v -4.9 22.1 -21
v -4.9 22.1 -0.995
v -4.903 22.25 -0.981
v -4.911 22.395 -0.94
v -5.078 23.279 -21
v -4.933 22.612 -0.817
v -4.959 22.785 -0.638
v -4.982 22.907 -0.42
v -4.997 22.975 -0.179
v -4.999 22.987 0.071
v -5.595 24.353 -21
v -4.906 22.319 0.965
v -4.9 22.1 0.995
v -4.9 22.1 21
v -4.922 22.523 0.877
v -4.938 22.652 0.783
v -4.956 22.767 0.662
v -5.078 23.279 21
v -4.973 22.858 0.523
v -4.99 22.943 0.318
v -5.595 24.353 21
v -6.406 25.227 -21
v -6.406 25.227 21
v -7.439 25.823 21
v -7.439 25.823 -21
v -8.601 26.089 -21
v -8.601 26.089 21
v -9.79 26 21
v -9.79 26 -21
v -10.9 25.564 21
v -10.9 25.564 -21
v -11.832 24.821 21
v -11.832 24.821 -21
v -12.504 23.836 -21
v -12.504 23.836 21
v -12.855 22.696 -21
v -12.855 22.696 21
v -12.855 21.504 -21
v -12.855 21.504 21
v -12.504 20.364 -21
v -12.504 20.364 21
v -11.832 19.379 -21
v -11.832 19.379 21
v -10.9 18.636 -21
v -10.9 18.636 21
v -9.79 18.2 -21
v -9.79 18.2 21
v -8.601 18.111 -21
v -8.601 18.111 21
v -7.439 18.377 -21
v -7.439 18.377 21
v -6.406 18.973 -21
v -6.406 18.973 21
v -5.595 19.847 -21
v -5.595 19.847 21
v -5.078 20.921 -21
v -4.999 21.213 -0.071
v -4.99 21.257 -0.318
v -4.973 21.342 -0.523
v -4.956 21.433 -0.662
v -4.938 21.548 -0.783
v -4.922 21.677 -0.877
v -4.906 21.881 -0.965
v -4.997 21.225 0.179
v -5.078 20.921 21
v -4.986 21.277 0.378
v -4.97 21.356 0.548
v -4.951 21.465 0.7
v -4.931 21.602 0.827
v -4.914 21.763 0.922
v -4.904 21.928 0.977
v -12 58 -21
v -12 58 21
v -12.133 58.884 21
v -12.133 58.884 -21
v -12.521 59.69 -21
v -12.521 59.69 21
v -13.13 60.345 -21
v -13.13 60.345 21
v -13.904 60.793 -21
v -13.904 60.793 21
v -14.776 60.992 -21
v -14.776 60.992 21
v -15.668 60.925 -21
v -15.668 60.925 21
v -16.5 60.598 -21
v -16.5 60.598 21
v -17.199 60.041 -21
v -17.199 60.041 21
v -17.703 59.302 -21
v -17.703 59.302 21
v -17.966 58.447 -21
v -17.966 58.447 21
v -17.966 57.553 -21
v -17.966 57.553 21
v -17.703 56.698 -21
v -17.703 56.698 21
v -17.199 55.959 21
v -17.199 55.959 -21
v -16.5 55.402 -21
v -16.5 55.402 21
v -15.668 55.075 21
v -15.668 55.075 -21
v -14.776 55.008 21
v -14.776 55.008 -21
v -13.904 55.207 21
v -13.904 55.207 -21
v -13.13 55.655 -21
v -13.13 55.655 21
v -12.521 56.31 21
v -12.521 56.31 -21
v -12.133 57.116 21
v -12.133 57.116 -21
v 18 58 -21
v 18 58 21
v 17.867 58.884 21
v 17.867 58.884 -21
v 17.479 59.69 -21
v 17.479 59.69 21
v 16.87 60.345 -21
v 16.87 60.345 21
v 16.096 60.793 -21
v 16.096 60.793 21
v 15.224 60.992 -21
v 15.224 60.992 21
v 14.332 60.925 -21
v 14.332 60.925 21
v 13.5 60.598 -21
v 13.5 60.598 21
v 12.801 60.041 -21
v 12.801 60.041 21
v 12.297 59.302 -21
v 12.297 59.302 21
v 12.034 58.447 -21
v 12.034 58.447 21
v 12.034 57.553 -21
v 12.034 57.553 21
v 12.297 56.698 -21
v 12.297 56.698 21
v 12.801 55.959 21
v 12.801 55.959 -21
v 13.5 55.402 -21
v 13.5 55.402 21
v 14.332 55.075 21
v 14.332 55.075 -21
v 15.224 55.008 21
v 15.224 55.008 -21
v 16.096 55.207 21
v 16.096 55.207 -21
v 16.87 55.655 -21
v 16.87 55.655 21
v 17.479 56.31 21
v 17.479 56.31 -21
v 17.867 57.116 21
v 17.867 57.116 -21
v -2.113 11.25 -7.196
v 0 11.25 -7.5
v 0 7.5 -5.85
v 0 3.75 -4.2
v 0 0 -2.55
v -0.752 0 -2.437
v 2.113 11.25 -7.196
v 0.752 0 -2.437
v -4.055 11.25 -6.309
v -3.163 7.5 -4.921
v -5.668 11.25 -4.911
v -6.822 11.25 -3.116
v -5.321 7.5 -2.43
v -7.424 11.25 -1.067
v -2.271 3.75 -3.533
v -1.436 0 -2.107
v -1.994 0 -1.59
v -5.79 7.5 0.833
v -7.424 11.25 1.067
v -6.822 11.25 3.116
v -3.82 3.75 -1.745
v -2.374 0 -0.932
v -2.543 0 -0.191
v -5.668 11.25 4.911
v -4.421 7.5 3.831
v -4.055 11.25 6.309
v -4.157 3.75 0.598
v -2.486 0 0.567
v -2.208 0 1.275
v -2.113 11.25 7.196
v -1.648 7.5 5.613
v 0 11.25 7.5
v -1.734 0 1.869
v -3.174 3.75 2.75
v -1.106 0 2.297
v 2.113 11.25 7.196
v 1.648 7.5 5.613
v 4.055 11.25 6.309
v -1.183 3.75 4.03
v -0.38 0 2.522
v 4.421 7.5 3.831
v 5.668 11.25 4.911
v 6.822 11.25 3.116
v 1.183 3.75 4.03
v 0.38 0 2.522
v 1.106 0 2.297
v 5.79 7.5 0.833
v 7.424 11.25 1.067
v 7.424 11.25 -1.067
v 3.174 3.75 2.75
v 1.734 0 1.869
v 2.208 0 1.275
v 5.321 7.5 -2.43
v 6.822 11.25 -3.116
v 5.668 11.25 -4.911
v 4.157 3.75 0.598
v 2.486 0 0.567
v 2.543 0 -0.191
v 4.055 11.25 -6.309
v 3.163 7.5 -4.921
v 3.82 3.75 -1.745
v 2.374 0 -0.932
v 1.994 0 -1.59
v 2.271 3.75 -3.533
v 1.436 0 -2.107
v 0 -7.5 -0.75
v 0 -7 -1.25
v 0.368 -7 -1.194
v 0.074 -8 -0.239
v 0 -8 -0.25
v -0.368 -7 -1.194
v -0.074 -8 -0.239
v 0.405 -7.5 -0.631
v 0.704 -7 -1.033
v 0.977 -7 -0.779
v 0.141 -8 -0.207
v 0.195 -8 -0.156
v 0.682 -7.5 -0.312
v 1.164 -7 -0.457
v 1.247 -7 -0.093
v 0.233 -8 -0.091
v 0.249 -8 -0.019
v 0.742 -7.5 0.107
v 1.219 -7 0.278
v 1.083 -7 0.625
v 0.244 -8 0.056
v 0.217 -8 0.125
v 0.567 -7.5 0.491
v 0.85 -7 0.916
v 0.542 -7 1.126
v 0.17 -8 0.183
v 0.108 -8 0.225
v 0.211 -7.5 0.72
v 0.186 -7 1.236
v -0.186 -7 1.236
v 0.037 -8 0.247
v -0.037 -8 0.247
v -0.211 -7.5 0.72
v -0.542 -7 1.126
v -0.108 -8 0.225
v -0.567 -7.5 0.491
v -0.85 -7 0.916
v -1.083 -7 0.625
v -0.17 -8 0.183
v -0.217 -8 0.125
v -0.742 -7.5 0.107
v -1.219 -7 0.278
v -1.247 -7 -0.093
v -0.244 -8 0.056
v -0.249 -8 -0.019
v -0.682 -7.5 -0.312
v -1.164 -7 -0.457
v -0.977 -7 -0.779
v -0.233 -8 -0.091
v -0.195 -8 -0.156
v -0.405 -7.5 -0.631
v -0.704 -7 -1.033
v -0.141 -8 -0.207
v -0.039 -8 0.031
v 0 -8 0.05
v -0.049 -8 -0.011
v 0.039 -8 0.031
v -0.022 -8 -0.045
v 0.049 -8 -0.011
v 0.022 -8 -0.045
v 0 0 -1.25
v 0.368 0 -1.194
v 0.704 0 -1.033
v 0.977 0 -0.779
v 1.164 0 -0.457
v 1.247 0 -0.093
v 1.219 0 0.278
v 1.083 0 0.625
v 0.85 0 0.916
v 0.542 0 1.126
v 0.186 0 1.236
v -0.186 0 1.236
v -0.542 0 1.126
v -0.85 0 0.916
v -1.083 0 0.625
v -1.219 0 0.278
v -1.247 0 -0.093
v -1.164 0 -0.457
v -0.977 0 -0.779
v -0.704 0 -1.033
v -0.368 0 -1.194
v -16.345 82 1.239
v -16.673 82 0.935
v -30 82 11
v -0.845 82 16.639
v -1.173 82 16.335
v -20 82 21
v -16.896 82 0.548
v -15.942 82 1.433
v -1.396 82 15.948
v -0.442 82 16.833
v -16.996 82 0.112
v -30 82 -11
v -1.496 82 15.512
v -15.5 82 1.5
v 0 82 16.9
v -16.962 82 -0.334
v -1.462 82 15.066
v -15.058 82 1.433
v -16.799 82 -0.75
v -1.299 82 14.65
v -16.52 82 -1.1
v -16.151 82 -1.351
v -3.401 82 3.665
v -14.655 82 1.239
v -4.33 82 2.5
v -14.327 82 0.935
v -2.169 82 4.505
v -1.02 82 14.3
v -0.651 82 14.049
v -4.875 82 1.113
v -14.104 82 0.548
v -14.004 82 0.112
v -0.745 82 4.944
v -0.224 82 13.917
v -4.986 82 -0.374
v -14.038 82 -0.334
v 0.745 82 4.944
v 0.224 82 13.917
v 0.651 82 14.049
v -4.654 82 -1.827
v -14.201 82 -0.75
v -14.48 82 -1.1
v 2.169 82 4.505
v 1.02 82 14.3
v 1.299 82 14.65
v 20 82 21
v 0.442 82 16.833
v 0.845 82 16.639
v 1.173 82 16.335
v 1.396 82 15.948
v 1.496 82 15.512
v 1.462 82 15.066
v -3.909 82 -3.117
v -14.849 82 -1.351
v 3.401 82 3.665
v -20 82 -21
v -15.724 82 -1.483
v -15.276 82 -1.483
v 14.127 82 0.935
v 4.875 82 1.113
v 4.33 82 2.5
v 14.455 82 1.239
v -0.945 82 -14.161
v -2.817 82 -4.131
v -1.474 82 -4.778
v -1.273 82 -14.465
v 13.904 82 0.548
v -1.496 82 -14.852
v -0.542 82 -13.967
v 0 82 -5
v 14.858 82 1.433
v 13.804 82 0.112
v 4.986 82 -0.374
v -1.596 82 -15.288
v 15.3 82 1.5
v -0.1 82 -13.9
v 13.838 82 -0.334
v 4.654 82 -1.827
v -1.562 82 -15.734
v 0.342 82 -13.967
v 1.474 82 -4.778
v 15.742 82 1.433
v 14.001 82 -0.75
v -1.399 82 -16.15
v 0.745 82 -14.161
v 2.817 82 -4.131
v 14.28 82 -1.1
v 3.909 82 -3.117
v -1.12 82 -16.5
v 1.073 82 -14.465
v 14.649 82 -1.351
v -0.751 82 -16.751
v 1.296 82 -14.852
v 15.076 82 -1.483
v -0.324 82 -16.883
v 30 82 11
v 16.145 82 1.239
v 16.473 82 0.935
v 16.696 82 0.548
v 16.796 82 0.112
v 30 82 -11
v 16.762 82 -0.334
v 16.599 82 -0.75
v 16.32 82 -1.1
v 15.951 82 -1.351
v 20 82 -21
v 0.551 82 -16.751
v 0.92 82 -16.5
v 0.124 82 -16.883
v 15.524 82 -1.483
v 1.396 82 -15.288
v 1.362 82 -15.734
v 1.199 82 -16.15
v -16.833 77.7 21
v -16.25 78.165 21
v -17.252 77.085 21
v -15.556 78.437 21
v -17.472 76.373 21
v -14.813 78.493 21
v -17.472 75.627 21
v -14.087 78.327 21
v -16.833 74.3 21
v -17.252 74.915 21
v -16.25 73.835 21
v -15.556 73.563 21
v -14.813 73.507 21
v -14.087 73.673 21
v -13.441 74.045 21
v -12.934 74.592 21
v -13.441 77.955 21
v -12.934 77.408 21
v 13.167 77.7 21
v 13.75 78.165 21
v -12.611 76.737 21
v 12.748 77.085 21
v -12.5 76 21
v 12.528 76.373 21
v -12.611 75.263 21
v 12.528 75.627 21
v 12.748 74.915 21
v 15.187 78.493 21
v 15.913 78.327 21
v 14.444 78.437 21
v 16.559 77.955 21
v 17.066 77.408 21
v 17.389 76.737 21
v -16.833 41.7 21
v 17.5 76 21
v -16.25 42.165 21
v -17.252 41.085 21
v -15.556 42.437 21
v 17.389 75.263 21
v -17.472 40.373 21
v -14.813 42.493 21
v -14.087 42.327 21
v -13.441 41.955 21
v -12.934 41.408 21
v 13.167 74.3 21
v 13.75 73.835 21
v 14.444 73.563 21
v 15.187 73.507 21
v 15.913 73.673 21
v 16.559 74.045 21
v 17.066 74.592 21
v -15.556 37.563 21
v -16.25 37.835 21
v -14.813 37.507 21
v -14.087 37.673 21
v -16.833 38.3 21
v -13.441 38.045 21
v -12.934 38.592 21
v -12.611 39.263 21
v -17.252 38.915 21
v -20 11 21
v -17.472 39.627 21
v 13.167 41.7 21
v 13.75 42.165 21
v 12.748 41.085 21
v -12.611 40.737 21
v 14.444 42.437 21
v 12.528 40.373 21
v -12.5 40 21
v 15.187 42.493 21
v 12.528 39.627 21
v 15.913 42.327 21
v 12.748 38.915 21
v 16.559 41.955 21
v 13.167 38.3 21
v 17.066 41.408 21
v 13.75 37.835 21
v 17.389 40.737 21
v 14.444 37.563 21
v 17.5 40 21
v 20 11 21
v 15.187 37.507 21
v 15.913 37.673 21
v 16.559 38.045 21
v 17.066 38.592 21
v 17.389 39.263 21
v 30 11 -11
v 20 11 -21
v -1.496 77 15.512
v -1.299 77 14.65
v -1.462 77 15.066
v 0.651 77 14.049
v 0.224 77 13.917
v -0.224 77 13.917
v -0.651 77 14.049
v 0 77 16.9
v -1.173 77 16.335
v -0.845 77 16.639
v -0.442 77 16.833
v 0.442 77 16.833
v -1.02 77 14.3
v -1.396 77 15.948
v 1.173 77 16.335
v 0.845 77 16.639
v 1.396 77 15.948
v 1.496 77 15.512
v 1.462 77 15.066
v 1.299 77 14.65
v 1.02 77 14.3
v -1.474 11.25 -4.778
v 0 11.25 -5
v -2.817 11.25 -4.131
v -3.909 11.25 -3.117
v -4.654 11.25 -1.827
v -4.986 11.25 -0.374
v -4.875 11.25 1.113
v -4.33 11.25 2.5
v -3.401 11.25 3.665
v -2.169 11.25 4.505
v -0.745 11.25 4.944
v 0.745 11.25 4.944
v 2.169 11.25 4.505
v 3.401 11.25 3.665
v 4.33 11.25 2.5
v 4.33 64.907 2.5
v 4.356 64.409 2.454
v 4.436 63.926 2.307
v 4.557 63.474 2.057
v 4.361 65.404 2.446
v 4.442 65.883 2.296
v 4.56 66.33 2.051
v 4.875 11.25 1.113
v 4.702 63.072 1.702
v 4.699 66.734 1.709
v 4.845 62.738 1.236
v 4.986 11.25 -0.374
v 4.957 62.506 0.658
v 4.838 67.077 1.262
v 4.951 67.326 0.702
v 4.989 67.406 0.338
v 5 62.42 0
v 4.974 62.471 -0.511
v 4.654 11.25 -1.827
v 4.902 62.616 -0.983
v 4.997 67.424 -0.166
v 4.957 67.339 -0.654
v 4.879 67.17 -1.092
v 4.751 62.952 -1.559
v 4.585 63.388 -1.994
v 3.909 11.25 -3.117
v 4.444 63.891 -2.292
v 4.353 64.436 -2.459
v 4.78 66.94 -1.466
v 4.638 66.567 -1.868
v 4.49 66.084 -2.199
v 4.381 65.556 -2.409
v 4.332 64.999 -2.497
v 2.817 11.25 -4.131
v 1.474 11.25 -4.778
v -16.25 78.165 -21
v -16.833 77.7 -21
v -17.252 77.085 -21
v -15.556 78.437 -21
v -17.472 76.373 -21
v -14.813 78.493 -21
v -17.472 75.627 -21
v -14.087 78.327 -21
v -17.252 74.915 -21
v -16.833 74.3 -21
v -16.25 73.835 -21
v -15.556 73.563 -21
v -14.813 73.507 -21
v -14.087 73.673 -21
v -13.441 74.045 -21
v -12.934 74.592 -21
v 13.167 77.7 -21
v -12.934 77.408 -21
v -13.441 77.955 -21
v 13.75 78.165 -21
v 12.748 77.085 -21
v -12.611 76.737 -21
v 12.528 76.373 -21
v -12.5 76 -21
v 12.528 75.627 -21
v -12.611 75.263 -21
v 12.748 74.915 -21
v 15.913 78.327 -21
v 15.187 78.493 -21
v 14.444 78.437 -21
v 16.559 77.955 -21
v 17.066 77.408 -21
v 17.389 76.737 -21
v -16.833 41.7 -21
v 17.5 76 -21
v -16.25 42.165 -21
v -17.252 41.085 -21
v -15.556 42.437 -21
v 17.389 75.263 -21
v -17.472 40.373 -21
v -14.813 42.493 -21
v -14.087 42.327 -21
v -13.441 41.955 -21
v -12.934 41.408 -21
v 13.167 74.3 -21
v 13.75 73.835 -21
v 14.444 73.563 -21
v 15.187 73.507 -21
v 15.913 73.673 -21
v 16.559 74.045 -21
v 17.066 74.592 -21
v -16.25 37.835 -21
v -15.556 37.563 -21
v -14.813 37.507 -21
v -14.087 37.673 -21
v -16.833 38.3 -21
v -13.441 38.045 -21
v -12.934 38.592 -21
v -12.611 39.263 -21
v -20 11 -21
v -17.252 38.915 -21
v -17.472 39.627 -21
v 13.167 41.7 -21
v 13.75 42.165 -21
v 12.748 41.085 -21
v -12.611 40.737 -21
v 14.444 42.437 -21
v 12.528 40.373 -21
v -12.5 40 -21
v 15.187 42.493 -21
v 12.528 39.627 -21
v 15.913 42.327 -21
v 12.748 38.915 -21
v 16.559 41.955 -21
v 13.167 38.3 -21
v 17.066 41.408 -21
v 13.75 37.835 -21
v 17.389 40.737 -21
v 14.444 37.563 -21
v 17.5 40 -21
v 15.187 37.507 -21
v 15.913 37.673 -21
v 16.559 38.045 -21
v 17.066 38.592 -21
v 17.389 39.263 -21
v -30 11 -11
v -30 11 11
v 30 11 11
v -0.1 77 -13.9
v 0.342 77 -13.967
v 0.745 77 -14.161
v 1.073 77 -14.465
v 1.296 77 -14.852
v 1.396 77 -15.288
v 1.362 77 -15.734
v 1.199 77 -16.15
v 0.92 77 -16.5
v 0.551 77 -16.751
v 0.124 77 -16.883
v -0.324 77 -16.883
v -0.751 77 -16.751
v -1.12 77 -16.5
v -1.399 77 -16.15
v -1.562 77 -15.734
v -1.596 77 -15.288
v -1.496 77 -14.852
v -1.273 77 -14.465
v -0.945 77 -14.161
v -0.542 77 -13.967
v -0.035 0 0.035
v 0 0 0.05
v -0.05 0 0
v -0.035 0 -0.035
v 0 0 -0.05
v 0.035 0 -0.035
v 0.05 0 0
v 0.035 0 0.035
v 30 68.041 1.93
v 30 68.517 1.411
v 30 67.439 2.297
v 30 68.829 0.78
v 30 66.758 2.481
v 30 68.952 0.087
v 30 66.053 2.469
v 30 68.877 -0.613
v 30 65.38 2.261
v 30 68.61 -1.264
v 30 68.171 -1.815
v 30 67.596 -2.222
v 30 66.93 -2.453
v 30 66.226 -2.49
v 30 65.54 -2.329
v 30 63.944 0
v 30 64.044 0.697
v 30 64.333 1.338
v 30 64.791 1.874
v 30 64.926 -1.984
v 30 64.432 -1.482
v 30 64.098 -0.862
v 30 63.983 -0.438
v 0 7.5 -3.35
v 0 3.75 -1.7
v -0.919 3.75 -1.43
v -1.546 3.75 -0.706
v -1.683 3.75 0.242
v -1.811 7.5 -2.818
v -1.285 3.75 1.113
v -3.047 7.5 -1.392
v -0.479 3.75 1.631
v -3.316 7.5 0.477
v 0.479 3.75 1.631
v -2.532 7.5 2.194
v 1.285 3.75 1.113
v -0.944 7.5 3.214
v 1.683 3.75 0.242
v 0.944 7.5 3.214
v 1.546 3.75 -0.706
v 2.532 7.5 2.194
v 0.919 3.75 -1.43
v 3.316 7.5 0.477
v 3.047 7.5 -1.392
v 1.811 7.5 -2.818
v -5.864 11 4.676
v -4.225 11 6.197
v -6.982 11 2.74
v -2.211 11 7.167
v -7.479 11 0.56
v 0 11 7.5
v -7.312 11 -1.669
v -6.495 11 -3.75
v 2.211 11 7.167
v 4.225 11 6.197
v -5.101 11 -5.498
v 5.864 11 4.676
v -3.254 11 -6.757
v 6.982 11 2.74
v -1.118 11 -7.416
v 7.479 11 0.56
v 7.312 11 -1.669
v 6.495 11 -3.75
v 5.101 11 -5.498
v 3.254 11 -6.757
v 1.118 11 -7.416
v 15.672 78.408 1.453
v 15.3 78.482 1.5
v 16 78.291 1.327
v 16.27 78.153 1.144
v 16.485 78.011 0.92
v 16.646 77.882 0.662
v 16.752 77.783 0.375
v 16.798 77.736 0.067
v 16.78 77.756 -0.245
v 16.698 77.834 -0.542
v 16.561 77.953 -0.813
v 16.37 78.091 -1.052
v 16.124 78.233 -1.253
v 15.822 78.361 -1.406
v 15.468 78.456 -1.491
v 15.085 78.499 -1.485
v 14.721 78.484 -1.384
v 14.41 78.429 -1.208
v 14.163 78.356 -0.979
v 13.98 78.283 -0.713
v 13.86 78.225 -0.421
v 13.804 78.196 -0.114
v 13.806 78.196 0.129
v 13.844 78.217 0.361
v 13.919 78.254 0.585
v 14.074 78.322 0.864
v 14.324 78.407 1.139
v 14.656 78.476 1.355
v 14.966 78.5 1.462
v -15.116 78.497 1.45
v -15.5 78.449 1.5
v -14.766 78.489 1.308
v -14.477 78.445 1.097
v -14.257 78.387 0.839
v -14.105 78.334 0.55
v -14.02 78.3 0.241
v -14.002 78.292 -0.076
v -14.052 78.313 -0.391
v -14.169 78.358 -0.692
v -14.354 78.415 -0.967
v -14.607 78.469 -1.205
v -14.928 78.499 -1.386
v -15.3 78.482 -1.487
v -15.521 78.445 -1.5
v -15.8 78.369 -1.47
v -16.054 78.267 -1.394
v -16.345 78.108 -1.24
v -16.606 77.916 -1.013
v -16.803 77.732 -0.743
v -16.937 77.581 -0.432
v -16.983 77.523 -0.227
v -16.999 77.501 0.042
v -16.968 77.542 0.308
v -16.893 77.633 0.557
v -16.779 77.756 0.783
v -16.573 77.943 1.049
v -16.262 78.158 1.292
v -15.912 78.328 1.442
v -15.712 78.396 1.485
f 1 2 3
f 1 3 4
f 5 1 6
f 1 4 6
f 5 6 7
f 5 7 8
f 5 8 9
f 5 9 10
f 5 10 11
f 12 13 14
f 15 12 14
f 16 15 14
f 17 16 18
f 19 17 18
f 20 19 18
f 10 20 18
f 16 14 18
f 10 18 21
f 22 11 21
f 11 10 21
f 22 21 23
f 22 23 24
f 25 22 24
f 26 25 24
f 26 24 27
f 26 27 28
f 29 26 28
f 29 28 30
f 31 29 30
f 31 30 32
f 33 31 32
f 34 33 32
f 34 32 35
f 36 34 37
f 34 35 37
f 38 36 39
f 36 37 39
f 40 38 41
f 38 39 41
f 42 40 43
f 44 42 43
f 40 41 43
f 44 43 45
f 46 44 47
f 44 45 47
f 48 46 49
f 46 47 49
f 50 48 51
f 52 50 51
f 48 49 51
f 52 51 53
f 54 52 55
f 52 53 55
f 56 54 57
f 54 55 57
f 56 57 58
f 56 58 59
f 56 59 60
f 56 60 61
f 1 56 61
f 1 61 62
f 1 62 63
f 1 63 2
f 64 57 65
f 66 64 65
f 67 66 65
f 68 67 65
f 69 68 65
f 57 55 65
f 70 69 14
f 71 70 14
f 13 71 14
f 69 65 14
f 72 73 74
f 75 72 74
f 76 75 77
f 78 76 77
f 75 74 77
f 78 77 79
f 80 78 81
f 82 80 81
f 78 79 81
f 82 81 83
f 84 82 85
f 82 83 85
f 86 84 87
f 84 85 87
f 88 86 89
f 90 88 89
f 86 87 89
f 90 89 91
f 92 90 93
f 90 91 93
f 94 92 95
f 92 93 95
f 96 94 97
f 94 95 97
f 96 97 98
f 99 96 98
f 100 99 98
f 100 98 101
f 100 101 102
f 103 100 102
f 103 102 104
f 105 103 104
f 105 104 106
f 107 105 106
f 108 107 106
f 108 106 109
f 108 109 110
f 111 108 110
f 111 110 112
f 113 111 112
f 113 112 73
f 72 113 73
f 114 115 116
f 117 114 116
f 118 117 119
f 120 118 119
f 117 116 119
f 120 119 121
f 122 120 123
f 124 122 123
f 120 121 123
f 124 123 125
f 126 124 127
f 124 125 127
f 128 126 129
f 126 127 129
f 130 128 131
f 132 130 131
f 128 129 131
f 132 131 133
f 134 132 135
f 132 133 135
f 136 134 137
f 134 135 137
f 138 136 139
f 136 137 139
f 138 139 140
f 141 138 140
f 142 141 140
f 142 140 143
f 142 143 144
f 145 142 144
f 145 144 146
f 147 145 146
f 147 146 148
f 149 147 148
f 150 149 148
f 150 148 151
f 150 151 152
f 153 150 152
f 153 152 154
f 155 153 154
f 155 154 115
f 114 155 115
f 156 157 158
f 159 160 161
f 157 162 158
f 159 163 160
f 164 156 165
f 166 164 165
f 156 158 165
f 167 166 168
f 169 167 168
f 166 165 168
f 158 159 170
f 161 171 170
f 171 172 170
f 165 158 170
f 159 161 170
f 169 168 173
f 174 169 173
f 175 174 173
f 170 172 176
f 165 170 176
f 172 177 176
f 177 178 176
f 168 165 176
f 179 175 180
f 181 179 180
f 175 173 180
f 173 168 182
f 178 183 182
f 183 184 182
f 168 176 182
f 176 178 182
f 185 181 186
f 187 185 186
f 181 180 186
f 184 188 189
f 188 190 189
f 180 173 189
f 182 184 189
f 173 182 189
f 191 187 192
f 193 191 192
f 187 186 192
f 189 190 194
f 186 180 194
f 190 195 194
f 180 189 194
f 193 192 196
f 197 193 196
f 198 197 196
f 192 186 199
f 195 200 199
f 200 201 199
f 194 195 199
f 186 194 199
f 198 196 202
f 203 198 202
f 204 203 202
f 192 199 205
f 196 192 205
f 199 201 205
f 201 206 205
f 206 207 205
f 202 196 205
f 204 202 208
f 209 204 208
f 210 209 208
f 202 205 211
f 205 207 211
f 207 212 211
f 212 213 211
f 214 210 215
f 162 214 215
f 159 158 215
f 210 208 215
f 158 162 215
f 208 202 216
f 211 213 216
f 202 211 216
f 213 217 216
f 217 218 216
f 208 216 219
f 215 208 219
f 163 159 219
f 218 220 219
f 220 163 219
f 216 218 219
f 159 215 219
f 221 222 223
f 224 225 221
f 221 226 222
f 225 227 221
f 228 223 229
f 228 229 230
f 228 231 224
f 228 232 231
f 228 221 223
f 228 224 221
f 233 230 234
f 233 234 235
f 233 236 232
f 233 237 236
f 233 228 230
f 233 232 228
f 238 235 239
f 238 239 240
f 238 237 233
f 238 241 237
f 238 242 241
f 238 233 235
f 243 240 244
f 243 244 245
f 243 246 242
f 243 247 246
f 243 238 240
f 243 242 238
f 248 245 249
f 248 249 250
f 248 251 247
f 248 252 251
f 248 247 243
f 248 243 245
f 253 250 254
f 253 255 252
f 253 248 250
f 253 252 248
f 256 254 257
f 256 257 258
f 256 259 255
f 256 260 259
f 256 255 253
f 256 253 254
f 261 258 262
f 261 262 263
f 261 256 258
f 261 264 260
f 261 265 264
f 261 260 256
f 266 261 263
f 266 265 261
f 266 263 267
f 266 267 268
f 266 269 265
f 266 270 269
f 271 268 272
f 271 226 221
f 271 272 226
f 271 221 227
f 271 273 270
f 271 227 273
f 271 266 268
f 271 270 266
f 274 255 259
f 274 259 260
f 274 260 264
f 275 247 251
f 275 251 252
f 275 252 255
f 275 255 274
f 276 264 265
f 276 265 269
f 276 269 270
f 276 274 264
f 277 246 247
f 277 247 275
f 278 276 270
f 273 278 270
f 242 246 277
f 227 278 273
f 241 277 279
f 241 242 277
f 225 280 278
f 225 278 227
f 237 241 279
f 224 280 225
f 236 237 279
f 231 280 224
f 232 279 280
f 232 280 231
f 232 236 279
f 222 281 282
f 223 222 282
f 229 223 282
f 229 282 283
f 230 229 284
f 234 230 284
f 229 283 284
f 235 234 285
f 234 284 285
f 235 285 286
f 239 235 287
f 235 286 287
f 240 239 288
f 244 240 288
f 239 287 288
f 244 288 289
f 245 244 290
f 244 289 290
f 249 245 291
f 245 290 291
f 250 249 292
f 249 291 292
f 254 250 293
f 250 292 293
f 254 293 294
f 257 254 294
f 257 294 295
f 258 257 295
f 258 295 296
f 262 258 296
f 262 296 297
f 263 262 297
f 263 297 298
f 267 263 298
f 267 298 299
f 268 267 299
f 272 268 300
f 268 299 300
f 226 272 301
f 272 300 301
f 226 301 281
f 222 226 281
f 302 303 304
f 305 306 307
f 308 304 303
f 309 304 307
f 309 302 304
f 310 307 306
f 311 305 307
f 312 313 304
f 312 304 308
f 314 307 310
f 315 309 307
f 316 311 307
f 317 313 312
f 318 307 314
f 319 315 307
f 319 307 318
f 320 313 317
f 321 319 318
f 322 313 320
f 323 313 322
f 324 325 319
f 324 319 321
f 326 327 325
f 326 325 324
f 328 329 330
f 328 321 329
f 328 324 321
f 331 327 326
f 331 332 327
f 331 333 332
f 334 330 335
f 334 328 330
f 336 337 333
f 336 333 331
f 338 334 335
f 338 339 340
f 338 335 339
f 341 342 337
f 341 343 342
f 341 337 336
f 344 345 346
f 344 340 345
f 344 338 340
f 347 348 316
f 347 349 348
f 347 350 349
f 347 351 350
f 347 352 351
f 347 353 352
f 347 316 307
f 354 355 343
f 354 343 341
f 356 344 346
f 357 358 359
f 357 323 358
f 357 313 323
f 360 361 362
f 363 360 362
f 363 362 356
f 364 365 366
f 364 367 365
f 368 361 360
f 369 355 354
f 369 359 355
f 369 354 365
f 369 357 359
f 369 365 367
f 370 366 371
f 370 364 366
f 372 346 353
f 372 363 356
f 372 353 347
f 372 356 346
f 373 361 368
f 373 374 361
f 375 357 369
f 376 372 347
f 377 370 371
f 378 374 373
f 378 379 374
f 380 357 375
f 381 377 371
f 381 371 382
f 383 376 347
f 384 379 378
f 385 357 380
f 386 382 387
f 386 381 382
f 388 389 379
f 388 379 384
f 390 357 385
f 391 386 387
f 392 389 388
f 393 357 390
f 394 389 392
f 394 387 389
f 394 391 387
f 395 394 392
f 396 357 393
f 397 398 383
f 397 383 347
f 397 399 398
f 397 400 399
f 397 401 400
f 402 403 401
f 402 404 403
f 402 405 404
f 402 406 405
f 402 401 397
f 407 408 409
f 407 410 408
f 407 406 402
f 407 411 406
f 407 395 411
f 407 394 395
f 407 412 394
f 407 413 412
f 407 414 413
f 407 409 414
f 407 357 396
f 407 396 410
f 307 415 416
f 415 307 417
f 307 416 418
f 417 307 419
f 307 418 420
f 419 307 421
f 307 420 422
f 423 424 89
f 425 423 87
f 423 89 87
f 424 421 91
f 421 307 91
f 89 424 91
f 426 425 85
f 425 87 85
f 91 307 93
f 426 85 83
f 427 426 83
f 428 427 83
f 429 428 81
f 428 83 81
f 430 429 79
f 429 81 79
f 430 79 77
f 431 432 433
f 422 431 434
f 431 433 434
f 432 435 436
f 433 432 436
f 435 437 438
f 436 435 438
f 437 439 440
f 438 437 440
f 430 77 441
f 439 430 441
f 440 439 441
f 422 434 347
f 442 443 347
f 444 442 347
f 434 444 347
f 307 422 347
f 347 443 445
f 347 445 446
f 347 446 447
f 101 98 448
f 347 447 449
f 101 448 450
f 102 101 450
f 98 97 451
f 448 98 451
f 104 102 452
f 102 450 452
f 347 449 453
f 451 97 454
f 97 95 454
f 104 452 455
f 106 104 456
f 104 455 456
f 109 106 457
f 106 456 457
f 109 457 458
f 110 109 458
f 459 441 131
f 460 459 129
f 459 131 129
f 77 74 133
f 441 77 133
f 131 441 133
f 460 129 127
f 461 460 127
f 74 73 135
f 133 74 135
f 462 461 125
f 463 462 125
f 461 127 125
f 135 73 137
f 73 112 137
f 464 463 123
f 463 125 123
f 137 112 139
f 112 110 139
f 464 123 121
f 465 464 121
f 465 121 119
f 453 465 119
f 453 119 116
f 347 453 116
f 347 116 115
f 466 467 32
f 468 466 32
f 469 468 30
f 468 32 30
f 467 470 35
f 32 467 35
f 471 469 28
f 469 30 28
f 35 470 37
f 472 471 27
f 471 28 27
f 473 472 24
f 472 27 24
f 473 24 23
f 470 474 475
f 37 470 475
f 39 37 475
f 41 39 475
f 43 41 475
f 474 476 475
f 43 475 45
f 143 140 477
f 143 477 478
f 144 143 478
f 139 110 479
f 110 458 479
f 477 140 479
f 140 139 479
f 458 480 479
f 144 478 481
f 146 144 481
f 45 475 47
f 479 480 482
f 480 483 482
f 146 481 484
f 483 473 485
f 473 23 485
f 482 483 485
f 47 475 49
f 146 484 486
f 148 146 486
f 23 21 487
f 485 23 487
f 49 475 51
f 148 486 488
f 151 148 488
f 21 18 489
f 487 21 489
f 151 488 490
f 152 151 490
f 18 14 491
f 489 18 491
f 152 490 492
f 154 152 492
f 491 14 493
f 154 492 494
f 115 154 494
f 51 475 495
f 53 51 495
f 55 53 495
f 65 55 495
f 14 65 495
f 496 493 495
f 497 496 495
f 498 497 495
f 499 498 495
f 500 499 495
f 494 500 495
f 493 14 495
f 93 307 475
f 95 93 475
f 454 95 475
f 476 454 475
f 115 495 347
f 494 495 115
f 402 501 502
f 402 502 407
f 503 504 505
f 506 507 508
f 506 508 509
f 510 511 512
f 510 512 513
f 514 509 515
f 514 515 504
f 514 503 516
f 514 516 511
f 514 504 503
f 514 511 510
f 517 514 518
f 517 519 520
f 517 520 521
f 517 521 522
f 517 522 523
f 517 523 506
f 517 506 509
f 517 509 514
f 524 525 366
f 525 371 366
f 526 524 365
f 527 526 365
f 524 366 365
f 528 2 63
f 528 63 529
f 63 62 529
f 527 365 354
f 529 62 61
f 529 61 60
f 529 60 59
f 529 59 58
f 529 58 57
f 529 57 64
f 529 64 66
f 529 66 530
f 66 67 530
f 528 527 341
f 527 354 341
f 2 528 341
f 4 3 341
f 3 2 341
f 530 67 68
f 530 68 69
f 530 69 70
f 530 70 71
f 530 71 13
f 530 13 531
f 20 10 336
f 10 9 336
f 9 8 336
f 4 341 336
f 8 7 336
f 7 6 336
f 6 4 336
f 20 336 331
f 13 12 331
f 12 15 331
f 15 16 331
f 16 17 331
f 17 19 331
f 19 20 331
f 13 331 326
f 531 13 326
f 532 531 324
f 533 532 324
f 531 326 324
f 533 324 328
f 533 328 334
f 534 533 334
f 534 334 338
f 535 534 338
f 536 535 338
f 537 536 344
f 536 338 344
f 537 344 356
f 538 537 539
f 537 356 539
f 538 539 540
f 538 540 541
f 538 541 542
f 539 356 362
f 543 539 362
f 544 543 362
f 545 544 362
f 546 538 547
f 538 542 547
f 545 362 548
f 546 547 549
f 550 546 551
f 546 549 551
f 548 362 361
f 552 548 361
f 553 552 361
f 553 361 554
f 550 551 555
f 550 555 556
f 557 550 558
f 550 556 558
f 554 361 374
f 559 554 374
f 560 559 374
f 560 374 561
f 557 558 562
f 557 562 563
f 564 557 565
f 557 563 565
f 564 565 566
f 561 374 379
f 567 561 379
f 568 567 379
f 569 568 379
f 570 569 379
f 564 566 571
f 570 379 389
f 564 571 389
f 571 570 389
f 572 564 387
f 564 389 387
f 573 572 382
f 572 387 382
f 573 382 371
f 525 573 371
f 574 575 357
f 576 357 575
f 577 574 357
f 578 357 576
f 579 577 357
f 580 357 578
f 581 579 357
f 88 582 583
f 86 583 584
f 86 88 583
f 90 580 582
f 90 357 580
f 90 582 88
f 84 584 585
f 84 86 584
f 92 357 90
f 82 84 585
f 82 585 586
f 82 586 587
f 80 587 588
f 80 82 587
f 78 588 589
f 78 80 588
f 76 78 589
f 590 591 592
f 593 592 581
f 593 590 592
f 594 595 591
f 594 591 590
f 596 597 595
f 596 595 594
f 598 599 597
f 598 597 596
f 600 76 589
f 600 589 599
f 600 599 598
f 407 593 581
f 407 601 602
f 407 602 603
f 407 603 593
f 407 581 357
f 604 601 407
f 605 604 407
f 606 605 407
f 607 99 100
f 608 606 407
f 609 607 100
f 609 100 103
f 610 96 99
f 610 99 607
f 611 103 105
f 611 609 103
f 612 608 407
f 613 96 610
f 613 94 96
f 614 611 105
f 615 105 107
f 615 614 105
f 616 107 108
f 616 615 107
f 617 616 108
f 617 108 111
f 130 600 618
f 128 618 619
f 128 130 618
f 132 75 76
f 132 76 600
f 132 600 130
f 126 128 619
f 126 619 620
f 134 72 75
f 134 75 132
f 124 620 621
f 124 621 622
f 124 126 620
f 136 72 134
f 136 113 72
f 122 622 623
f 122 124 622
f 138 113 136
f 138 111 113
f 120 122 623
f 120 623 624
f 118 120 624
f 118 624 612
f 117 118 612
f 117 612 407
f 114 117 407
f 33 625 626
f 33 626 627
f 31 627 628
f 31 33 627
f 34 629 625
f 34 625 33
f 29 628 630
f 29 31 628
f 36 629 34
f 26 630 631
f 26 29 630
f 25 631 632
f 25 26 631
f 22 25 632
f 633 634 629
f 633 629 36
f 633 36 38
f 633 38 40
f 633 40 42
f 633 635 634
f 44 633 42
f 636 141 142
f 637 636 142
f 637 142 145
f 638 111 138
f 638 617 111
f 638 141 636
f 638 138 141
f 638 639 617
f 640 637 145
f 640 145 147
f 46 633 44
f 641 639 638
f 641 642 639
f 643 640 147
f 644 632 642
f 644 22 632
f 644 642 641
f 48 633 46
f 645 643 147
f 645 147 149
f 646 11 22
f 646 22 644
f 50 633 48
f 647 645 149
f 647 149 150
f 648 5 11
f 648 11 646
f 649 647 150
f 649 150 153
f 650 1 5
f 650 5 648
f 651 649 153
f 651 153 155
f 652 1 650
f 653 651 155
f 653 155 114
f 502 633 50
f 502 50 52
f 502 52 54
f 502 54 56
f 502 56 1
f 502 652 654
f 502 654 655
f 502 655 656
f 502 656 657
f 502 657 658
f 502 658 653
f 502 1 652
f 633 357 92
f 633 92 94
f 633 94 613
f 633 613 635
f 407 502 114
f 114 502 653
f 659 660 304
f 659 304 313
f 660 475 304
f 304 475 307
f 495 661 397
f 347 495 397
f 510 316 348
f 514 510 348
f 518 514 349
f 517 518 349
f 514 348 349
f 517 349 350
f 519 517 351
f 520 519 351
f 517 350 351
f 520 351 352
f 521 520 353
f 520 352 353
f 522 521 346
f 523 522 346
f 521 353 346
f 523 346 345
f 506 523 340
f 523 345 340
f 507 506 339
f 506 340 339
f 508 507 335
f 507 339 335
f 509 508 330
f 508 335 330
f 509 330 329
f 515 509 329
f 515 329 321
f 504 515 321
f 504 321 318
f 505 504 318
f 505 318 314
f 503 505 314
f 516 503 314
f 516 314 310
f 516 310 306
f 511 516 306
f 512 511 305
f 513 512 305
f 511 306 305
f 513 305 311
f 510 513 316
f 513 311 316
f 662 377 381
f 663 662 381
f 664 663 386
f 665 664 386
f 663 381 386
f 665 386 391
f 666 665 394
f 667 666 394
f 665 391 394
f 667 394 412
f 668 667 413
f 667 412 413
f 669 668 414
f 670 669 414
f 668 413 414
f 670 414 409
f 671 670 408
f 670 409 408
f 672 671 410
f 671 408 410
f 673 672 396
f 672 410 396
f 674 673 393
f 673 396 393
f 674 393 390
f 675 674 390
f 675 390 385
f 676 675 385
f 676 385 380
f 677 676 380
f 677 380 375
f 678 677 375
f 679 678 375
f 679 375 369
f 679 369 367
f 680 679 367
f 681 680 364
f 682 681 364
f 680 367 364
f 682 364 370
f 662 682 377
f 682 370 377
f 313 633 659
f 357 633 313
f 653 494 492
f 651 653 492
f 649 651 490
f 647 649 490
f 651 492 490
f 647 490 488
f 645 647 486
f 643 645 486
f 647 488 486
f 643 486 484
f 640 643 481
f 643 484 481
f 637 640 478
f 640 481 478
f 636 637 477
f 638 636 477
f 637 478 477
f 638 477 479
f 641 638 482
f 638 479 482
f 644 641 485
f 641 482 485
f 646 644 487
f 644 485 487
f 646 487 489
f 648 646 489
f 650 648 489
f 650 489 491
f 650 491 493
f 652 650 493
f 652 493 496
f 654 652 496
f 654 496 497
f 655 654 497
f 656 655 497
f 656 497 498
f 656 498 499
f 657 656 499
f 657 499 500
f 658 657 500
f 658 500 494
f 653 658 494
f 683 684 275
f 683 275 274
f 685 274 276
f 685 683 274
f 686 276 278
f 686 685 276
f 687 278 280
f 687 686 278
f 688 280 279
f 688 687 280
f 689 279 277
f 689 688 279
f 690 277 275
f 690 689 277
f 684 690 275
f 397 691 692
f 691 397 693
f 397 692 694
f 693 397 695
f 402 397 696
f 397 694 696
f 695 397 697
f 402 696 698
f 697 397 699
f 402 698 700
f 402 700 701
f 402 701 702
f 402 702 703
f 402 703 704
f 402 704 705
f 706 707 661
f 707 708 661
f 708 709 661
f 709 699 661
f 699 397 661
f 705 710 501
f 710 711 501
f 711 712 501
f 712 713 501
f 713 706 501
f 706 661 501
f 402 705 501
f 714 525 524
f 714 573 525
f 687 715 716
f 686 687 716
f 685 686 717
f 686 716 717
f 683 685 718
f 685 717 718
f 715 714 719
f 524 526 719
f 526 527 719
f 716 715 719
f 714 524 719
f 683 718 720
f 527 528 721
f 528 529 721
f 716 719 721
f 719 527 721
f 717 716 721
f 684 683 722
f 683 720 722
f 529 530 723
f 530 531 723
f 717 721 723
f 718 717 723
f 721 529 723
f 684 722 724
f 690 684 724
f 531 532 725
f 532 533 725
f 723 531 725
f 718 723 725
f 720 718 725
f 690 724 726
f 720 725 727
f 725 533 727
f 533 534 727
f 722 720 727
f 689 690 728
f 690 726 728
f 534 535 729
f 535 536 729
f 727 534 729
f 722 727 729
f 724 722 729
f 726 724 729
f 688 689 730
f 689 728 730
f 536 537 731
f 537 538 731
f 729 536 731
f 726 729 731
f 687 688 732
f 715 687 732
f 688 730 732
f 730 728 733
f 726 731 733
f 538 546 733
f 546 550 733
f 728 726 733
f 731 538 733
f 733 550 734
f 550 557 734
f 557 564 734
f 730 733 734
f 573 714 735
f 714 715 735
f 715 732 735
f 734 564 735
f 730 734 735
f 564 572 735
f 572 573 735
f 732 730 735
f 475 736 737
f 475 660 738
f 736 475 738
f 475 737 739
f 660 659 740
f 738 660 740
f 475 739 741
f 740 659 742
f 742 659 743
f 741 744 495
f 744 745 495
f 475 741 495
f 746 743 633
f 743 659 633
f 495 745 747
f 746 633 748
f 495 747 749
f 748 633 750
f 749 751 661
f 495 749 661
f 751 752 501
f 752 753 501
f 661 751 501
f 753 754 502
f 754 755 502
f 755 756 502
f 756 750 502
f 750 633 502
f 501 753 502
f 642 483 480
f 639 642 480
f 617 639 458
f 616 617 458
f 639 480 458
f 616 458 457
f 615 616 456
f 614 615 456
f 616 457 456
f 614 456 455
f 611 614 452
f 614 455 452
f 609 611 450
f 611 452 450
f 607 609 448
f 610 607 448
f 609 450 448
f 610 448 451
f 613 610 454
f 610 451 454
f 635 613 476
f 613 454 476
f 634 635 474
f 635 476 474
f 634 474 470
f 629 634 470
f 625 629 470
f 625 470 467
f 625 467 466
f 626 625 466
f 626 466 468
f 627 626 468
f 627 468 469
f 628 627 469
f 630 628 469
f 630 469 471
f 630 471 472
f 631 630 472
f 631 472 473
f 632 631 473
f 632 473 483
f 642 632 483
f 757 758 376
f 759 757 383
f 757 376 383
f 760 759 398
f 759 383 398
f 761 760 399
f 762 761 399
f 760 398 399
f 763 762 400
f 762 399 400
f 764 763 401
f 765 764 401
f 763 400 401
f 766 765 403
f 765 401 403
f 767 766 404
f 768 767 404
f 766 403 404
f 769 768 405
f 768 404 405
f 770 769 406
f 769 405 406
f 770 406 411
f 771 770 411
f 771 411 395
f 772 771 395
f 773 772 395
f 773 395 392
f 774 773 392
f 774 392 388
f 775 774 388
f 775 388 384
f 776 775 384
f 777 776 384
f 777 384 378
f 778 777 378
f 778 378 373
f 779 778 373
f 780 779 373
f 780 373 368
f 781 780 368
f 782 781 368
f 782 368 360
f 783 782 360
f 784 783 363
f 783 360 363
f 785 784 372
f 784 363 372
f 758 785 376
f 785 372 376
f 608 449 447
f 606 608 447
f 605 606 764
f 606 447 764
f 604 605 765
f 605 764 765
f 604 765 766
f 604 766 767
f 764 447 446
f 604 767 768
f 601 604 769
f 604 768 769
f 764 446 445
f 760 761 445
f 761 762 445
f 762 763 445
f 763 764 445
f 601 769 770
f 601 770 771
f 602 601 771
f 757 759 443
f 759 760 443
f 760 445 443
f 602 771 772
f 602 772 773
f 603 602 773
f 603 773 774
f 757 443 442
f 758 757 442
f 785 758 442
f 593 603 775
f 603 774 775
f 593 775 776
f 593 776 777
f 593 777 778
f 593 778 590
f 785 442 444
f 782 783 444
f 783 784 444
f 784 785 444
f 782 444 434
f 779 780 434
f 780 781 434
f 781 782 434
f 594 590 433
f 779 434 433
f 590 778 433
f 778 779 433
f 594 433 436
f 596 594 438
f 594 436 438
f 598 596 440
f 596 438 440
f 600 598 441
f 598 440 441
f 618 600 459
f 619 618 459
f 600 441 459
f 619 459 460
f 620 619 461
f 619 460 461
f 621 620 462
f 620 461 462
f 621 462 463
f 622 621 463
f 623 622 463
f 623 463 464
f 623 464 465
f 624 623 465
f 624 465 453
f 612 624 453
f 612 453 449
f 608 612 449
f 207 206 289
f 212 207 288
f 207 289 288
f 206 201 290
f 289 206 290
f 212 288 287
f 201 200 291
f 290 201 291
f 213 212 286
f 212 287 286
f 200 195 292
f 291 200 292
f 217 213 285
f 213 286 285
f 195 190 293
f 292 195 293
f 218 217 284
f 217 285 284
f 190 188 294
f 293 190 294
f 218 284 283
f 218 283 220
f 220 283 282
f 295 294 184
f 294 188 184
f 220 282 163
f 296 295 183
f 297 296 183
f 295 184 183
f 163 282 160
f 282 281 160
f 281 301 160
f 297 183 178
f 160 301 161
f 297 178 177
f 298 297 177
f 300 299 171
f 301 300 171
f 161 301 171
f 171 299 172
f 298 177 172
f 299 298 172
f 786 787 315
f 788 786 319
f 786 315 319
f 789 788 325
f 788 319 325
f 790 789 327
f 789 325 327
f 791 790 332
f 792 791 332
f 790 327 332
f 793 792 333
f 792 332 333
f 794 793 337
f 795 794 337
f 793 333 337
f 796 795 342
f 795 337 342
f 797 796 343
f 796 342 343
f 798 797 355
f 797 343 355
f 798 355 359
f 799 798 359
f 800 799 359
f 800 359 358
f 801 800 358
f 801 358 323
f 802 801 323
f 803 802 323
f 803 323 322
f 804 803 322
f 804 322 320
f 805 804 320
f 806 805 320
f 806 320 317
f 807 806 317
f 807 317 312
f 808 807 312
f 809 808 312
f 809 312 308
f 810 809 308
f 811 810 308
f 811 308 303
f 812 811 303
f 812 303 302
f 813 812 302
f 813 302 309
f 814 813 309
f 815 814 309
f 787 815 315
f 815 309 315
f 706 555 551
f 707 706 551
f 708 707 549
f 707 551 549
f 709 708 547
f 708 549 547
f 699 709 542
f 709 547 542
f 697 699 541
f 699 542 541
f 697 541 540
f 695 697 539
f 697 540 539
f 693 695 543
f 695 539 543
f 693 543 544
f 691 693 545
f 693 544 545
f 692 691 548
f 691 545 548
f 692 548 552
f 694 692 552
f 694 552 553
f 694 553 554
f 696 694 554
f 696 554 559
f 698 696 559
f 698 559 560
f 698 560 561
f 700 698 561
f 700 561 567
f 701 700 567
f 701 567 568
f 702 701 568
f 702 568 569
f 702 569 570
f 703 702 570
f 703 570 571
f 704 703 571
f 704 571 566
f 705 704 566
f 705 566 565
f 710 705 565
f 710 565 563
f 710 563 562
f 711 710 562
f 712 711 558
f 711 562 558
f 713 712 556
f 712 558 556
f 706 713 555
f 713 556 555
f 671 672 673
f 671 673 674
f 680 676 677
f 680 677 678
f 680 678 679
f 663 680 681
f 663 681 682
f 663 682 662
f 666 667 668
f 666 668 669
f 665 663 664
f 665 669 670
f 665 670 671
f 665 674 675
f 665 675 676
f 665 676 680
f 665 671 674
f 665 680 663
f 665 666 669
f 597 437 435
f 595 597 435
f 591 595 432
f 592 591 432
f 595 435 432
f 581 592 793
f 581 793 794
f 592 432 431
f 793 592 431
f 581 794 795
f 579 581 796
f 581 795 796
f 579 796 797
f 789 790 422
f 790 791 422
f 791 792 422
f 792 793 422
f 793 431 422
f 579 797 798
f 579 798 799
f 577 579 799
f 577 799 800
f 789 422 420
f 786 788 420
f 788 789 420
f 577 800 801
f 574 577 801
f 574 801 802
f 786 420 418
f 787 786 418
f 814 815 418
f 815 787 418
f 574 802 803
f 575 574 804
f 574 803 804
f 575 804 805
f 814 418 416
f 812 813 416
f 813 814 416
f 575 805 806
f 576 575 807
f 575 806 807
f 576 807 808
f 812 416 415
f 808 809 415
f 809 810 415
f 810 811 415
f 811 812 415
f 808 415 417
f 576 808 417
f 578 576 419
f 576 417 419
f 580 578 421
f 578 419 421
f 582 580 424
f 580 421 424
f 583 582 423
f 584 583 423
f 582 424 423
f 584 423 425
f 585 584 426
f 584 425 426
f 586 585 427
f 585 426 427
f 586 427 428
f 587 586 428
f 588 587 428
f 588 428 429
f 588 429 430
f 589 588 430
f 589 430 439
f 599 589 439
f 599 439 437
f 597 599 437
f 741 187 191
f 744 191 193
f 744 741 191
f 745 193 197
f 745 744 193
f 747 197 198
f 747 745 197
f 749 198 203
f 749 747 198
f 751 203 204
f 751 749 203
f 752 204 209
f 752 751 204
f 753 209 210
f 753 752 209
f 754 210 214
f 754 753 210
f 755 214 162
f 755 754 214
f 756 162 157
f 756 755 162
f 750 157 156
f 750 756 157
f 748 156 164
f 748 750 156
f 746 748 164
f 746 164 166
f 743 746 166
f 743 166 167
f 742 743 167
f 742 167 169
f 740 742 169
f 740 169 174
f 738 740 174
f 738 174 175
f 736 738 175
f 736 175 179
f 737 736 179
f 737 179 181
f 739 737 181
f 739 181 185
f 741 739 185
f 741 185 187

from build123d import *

# Parameters (mm, degrees)
BOSS_EXTRUDE1_START = -71
SKETCH2_W           = 60
SKETCH2_H           = 42
SKETCH2_R           = 7.5
BOSS_EXTRUDE1_DEPTH = 71
SKETCH3_R           = 2.5
SKETCH3_R_2         = 3
SKETCH3_R_3         = 4
CUT_EXTRUDE1_DEPTH  = 97.89169211
SKETCH7_R           = 2.5
CUT_EXTRUDE3_DEPTH  = 81
SKETCH10_R          = 1.25
SKETCH10_R_2        = 0.05
BOSS_EXTRUDE2_DEPTH = 8
CHAMFER10_SIZE      = 1
SKETCH12_R          = 1.5
CUT_EXTRUDE5_DEPTH  = 5
CHAMFER11_SIZE      = 10


with BuildPart() as part:
    # Sketch1 → Revolve1 (revolve)
    with BuildSketch(Plane.XY, mode=Mode.PRIVATE) as revolve1_sk:
        Polygon((0.05, 0), (5, 11.25), (5, 82), (7.5, 82), (7.5, 11.25), (2.55, 0), align=None)
    revolve(revolve1_sk.sketch.rotate(Axis((0, 0, 0), (0, 1, 0)), 90), axis=Axis((0, 0, 0), (0, 1, 0)))

    # Sketch2 → Boss-Extrude1 (add)
    with BuildSketch(Plane(origin=(0, 82, 0), x_dir=(1, 0, 0), z_dir=(0, 1, 0)).offset(BOSS_EXTRUDE1_START)):
        Rectangle(SKETCH2_W, SKETCH2_H)
        with Locations(Location((0, 0, 0), (0, 0, 270))):
            Circle(SKETCH2_R, mode=Mode.SUBTRACT)
    extrude(amount=BOSS_EXTRUDE1_DEPTH)

    # Sketch3 → Cut-Extrude1 (cut, through all)
    with BuildSketch(Plane.XY.offset(21)):
        with Locations((-15, 76)):
            Circle(SKETCH3_R)
        with Locations((-15, 58)):
            Circle(SKETCH3_R_2)
        with Locations((-15, 40)):
            Circle(SKETCH3_R)
        with Locations((15, 76)):
            Circle(SKETCH3_R)
        with Locations((15, 58)):
            Circle(SKETCH3_R_2)
        with Locations((15, 40)):
            Circle(SKETCH3_R)
        with Locations((-8.9, 22.1)):
            Circle(SKETCH3_R_3)
    extrude(amount=-CUT_EXTRUDE1_DEPTH, mode=Mode.SUBTRACT)

    # Sketch7 → Cut-Extrude3 (cut)
    with BuildSketch(Plane(origin=(0, 0, 0), x_dir=(0, 0, 1), z_dir=(-0.9981461553891549, -0.0608625704505587, 0))):
        with Locations(Location((0, 64.5, 0), (0, 0, 270))):
            Circle(SKETCH7_R)
    extrude(amount=-CUT_EXTRUDE3_DEPTH, mode=Mode.SUBTRACT)

    # Sketch10 → Boss-Extrude2 (add)
    with BuildSketch(Plane.XZ):
        with Locations(Location((0, 0, 0), (0, 0, 270))):
            Circle(SKETCH10_R)
        with Locations(Location((0, 0, 0), (0, 0, 90))):
            Circle(SKETCH10_R_2, mode=Mode.SUBTRACT)
    extrude(amount=BOSS_EXTRUDE2_DEPTH)

    # Chamfer10
    chamfer10_edges = [part.edges().sort_by_distance(p)[0] for p in [
        (0, -8, 1.25),
    ]]
    chamfer(chamfer10_edges, length=CHAMFER10_SIZE)

    # Sketch12 → Cut-Extrude5 (cut)
    with BuildSketch(Plane(origin=(0, 82, 0), x_dir=(1, 0, 0), z_dir=(0, 1, 0))):
        with Locations(Location((-15.5, 0, 0), (0, 0, 270))):
            Circle(SKETCH12_R)
        with Locations(Location((-0.1, 15.4, 0), (0, 0, 270))):
            Circle(SKETCH12_R)
        with Locations(Location((15.3, 0, 0), (0, 0, 270))):
            Circle(SKETCH12_R)
        with Locations(Location((0, -15.4, 0), (0, 0, 270))):
            Circle(SKETCH12_R)
    extrude(amount=-CUT_EXTRUDE5_DEPTH, mode=Mode.SUBTRACT)

    # Chamfer11
    chamfer11_edges = [part.edges().sort_by_distance(p)[0] for p in [
        (30, 46.5, -21),
        (30, 46.5, 21),
        (-30, 46.5, 21),
        (-30, 46.5, -21),
    ]]
    chamfer(chamfer11_edges, length=CHAMFER11_SIZE)


solid = part.part
